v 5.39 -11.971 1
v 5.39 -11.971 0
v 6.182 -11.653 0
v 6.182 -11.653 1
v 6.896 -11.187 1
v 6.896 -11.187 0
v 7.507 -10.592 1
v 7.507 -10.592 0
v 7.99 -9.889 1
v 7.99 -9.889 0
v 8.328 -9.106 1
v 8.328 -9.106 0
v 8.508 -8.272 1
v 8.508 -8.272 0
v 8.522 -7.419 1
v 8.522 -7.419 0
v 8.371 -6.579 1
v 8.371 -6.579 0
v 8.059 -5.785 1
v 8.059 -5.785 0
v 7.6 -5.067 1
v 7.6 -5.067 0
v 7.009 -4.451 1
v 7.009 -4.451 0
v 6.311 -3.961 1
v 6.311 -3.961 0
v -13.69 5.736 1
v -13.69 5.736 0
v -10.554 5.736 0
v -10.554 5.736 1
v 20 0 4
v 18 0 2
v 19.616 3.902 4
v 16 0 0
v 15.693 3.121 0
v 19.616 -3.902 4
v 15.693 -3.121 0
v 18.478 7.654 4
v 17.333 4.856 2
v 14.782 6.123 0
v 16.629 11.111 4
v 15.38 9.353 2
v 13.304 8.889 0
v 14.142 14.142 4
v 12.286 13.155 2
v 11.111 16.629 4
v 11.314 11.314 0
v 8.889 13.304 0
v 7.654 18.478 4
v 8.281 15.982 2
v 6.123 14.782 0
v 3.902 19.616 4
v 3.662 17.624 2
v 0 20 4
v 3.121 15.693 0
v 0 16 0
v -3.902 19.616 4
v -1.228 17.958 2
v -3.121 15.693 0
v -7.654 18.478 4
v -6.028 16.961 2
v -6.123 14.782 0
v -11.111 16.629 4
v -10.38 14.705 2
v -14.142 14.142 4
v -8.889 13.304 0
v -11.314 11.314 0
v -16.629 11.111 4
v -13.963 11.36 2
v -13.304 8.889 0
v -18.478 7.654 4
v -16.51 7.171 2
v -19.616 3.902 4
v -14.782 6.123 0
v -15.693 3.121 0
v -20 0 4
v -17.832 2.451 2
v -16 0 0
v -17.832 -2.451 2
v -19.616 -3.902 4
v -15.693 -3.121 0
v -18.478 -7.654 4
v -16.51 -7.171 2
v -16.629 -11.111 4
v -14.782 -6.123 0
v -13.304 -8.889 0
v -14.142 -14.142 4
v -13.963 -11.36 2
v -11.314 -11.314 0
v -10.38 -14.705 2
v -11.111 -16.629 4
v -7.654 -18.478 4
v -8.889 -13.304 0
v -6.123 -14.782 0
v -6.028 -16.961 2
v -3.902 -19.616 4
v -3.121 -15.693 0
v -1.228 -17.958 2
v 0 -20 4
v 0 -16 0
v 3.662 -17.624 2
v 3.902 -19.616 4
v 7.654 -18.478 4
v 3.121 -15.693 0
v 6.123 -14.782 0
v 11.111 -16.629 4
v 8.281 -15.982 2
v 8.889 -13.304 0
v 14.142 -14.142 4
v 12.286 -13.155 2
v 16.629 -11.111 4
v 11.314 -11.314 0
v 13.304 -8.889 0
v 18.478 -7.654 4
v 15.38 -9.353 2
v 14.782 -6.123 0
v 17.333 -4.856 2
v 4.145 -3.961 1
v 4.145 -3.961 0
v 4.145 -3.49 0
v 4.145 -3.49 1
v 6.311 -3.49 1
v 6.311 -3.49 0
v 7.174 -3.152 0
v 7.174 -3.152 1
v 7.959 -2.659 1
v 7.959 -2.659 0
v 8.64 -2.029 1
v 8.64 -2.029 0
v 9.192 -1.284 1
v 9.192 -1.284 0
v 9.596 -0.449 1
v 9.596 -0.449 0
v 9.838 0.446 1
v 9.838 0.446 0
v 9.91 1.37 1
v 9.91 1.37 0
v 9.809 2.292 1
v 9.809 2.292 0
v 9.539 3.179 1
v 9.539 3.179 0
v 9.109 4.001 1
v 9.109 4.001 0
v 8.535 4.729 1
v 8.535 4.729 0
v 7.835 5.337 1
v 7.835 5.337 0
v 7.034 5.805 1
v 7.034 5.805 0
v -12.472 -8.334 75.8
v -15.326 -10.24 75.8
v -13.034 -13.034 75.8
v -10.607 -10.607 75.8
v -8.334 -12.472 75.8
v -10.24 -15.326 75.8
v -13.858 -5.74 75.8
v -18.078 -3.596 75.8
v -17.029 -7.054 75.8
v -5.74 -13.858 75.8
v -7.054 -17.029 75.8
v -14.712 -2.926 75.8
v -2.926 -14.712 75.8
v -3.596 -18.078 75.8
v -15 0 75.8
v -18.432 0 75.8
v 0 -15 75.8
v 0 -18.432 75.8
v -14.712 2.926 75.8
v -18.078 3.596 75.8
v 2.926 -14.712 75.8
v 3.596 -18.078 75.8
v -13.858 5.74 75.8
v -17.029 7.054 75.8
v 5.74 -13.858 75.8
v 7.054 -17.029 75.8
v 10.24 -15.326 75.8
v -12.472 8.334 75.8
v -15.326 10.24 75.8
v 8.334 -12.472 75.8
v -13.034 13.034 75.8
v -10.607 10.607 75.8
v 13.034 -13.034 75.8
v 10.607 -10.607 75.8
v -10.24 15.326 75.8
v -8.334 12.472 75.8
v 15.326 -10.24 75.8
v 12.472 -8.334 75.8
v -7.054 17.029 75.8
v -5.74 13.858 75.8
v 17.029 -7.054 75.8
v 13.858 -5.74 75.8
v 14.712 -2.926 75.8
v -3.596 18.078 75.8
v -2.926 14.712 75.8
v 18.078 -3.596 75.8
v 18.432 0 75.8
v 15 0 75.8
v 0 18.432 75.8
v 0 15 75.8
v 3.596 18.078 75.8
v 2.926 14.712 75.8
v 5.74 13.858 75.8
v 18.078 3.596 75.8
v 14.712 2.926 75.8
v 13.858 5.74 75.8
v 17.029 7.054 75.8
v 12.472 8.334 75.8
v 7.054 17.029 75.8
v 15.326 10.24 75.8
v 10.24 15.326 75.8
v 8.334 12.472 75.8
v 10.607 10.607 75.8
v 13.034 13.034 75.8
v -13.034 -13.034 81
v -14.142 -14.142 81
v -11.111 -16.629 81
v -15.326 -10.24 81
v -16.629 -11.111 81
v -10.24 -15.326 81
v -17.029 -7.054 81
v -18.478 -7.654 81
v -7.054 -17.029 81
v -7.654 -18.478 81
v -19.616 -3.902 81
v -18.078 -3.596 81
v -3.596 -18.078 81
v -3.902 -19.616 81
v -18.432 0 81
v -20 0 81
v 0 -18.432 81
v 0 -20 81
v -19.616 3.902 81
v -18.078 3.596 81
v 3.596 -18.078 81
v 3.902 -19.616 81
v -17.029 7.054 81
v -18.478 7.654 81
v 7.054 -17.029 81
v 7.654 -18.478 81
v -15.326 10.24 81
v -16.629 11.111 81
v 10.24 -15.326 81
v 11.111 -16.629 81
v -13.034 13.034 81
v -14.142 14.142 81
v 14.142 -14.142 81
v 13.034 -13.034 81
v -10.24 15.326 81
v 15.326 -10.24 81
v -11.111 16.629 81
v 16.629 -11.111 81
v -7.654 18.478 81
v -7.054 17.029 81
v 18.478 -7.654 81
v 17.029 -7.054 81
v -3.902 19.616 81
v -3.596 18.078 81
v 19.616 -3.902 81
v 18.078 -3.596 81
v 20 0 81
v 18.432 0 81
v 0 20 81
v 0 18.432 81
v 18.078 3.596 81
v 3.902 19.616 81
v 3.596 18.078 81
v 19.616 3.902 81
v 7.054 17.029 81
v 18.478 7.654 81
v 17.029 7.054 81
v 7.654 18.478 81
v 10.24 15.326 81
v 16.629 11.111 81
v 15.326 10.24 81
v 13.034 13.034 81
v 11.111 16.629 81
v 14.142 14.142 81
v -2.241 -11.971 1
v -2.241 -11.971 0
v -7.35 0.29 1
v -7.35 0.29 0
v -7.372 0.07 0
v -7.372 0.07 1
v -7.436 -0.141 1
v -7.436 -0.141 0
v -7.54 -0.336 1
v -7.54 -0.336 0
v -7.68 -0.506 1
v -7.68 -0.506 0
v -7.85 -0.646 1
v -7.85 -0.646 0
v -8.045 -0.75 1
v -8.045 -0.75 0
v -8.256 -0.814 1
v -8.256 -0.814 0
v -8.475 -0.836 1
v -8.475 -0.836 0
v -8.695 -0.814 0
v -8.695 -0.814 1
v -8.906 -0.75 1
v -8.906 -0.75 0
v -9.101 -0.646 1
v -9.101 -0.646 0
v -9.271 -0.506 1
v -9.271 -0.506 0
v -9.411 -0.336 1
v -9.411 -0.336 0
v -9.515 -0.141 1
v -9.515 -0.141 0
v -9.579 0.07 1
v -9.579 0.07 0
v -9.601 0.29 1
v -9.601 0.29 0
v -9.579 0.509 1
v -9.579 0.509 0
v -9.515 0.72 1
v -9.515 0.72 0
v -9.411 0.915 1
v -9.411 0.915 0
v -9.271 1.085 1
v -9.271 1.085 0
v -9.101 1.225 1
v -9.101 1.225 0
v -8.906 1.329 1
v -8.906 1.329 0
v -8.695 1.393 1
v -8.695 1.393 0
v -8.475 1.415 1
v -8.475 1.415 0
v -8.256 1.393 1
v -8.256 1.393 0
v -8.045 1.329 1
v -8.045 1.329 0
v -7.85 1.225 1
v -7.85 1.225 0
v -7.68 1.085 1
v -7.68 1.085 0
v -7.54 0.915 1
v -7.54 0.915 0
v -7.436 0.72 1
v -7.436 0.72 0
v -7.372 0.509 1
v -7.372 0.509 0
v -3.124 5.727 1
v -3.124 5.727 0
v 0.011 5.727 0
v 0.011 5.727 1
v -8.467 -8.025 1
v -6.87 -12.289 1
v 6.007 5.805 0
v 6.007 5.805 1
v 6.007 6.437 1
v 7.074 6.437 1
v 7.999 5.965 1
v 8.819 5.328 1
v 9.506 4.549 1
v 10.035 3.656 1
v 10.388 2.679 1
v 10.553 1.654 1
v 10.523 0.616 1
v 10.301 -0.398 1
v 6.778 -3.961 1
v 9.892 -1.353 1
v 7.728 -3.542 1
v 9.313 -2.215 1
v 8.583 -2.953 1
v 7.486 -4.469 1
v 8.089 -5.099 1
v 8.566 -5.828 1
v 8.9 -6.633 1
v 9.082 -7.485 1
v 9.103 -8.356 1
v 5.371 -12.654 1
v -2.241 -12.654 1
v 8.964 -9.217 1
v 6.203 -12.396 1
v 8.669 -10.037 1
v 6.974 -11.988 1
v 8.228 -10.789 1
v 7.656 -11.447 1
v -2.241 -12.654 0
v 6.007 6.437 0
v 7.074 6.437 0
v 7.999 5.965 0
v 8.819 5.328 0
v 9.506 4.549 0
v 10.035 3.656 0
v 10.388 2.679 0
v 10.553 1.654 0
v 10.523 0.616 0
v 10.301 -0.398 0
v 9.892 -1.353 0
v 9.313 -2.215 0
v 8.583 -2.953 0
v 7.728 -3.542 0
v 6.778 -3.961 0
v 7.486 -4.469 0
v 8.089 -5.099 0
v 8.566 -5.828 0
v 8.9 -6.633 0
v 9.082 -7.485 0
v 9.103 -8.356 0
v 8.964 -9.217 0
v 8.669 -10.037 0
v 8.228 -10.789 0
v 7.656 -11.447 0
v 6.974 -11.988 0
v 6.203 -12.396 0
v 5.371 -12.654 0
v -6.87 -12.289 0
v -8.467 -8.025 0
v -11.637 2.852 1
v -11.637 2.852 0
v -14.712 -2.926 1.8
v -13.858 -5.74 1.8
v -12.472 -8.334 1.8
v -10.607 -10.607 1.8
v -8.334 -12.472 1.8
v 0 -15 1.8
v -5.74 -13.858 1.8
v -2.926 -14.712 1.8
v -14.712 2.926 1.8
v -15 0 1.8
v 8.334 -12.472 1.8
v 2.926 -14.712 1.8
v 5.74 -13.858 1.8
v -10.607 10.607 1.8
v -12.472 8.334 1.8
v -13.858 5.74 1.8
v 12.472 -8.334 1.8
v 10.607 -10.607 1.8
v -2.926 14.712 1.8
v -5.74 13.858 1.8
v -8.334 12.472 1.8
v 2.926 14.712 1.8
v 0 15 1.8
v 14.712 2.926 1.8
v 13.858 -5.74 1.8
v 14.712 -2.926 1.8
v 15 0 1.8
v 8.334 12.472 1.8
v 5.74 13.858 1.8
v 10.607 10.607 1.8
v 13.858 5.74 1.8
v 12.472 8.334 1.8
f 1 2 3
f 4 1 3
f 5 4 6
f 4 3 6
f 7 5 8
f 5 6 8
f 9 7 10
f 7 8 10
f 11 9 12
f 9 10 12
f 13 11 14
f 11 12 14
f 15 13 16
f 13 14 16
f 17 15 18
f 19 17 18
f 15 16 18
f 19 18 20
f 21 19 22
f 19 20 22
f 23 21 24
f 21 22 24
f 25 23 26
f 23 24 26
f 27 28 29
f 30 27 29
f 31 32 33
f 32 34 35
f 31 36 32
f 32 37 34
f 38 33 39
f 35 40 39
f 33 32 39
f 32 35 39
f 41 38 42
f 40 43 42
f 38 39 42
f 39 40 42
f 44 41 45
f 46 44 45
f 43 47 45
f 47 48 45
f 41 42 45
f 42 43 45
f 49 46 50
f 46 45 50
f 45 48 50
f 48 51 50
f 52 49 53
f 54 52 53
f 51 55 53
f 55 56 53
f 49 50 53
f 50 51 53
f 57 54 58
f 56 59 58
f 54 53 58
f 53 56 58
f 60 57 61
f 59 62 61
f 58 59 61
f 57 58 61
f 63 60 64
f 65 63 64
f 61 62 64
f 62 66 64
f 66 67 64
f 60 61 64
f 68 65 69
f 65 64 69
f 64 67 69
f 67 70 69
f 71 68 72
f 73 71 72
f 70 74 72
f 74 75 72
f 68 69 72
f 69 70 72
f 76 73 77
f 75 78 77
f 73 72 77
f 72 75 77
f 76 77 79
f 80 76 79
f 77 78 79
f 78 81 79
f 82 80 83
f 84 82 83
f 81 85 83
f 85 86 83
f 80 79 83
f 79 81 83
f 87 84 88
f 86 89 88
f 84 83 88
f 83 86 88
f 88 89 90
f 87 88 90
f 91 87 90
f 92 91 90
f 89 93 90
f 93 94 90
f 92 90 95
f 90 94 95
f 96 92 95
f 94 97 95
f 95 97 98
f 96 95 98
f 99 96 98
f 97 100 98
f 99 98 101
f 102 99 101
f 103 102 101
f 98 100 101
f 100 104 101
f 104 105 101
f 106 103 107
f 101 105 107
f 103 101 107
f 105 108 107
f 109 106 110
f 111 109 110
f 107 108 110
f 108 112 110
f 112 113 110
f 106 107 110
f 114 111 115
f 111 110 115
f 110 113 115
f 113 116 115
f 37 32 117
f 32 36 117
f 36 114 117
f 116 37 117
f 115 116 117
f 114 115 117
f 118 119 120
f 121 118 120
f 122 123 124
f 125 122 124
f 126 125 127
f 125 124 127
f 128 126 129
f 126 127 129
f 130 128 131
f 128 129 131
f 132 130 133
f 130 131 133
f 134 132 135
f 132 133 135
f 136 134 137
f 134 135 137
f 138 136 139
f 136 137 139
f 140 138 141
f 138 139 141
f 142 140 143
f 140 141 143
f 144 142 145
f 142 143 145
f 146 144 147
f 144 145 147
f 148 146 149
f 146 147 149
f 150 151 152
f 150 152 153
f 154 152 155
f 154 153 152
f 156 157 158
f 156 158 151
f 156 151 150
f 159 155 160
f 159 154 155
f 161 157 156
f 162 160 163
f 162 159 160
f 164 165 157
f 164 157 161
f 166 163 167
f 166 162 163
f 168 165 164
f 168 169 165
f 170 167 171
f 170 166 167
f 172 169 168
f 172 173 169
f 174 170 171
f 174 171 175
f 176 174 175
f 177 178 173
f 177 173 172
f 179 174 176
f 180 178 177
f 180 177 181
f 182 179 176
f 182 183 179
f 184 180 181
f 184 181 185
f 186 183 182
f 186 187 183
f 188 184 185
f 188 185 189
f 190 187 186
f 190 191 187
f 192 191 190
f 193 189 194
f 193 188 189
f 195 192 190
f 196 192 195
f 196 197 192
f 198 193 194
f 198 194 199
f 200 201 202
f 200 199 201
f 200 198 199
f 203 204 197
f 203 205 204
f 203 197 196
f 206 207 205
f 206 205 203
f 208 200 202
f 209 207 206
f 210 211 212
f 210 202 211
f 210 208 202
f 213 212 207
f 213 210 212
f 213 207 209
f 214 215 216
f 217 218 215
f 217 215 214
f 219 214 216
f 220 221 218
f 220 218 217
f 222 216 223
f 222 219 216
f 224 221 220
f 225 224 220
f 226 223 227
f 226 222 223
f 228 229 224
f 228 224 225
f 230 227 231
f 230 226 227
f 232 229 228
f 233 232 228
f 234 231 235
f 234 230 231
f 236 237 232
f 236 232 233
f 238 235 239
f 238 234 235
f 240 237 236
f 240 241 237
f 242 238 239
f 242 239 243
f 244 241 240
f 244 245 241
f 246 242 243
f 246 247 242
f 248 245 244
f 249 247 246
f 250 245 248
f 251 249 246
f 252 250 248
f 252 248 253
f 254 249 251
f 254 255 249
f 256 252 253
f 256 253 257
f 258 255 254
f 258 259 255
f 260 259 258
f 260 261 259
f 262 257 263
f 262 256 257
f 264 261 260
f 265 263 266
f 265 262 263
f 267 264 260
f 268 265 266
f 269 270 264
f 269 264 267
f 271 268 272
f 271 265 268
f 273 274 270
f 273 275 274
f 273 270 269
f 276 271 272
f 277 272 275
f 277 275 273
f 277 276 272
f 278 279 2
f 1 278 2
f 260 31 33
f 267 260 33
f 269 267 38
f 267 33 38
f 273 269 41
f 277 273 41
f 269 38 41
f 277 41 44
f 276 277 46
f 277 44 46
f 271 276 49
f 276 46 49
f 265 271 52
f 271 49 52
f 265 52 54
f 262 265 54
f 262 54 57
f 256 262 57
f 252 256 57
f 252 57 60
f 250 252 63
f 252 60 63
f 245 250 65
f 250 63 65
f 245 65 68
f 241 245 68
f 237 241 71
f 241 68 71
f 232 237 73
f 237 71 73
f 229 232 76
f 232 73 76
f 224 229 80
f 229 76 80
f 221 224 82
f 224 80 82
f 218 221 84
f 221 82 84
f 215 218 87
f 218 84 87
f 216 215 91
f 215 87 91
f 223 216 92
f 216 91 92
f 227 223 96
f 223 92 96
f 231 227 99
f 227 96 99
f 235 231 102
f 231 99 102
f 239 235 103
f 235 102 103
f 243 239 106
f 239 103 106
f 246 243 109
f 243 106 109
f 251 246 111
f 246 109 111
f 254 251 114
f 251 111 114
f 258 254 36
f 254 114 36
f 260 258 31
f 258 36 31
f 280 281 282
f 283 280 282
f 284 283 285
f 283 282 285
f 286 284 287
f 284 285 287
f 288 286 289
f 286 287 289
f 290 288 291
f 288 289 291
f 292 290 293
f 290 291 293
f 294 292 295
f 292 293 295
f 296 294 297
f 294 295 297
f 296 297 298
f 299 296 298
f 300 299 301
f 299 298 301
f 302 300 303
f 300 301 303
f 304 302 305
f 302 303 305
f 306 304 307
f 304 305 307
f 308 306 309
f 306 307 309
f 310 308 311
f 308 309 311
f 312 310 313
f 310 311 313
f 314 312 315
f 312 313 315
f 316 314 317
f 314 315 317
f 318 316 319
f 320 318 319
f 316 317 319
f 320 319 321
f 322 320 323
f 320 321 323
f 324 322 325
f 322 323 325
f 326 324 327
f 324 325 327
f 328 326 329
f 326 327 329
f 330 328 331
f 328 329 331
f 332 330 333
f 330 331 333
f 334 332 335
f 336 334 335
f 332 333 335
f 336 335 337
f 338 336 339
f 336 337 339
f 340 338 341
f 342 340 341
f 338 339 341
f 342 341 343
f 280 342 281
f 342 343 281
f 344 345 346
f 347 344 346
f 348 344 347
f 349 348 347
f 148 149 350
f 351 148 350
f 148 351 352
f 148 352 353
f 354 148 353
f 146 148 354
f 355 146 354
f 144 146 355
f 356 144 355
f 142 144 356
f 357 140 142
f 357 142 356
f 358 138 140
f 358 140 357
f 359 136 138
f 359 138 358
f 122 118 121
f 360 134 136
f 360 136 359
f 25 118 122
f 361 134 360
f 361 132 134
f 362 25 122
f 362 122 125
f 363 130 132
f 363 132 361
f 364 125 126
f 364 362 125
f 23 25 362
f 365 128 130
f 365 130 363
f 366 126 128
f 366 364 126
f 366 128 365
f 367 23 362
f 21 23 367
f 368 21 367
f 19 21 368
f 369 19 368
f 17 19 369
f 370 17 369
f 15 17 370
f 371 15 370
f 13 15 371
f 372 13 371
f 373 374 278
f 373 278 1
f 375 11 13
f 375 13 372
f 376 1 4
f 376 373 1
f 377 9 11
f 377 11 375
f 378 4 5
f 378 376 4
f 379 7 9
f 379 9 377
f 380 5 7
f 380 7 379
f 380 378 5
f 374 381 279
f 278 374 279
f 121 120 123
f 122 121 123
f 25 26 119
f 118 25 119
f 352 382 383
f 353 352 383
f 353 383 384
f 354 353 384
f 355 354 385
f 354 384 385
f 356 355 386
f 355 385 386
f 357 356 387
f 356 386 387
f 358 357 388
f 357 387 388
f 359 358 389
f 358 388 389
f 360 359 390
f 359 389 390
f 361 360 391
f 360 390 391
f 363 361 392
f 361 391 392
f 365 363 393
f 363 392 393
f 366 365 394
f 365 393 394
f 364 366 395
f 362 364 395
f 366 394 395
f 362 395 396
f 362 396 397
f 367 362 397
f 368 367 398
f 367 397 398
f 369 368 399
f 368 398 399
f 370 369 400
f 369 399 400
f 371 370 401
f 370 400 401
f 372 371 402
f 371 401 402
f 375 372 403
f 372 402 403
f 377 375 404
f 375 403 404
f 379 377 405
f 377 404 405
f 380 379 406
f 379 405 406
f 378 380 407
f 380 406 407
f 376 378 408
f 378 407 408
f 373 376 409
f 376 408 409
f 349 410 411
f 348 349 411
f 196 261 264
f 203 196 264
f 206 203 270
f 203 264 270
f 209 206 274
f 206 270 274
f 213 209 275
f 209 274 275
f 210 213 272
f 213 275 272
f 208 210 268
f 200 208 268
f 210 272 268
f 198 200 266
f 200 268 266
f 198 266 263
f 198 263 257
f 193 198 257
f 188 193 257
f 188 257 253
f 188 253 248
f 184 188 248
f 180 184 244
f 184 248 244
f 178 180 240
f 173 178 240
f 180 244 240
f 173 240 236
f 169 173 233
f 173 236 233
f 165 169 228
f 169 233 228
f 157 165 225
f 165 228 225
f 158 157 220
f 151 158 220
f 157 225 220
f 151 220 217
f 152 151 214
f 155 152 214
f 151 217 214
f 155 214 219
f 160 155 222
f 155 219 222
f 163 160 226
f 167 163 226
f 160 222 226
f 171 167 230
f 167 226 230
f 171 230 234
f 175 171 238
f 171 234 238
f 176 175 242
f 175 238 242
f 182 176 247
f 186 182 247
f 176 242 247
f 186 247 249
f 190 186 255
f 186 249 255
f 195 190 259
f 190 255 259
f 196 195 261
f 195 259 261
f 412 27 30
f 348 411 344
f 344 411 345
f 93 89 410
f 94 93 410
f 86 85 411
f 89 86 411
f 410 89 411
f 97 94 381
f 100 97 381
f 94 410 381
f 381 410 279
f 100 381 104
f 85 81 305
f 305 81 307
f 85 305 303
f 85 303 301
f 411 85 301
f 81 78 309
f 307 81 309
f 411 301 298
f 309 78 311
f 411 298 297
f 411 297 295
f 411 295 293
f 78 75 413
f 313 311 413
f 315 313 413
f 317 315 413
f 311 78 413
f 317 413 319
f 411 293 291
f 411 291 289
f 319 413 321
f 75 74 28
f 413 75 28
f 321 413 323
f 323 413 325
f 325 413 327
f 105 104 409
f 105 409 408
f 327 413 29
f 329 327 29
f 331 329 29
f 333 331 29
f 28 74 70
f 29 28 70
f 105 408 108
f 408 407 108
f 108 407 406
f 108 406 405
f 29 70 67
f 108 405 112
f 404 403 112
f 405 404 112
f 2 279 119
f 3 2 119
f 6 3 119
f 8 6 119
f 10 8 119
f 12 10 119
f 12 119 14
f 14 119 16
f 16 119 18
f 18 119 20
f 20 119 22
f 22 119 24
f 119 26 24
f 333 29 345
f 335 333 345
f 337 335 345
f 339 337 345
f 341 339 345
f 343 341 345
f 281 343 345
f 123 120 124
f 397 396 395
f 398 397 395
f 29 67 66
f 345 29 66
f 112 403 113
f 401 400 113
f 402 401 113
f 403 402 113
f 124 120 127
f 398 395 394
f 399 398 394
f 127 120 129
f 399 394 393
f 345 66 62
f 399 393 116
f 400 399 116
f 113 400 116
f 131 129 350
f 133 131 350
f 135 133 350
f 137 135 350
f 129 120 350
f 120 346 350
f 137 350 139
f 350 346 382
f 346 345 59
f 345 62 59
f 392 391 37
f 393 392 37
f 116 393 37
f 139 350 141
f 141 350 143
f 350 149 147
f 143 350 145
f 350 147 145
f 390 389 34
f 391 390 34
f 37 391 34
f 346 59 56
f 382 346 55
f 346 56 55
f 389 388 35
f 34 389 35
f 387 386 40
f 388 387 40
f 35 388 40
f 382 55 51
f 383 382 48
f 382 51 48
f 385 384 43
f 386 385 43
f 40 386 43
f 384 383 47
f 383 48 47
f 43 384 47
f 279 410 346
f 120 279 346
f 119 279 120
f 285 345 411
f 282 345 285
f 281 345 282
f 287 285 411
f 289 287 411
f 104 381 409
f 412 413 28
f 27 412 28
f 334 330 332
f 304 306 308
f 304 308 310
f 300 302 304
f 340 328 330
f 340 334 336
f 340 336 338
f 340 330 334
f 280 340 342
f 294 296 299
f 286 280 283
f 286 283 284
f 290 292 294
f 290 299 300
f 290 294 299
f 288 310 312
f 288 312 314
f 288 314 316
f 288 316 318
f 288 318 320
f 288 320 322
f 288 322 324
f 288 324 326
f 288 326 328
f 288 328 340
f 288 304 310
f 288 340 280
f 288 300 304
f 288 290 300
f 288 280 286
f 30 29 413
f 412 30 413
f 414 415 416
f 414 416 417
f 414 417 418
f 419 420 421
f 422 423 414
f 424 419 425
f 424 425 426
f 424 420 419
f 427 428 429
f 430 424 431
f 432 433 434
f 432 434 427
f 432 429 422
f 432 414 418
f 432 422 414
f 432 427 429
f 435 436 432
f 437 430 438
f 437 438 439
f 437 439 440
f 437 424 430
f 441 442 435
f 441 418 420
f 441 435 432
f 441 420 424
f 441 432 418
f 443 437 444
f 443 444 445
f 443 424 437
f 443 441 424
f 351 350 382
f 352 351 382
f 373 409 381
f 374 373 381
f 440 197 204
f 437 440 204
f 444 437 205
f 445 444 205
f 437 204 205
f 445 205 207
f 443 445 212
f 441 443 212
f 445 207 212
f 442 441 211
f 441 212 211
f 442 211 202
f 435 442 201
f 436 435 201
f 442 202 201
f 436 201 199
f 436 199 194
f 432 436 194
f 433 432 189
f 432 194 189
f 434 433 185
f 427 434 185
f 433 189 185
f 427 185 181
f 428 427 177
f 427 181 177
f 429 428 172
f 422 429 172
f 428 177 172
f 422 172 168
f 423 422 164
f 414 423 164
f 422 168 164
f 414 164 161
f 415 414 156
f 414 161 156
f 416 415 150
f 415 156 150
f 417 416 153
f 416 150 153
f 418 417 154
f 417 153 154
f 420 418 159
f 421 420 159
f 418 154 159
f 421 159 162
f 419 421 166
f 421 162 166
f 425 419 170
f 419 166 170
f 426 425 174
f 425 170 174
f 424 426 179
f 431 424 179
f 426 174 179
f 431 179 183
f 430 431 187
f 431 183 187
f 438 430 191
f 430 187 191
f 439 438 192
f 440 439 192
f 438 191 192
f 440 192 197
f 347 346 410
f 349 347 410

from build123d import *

# Parameters (mm, degrees)
F0_R      = 20
F1_DEPTH  = 81
F2_R      = 18.432207
F3_DEPTH  = 5.2
F4_R      = 15
F5_DEPTH  = 74
F6_SIZE   = 4
F7_R      = 1.125396
F8_DEPTH  = 1
F10_DEPTH = 1


with BuildPart() as f1:
    # F0 (on Top) → F1 (new body)
    with BuildSketch(Plane.XY):
        Circle(F0_R)
    extrude(amount=F1_DEPTH)

    # F2 (on face) → F3 (cut)
    with BuildSketch(Plane.XY.offset(81)):
        Circle(F2_R)
    extrude(amount=-F3_DEPTH, mode=Mode.SUBTRACT)

    # F4 (on face) → F5 (cut)
    with BuildSketch(Plane.XY.offset(75.8)):
        Circle(F4_R)
    extrude(amount=-F5_DEPTH, mode=Mode.SUBTRACT)

    # F6
    f6_edges = [f1.edges().sort_by_distance(p)[0] for p in [
        (-20, 0, 0),
    ]]
    chamfer(f6_edges, length=F6_SIZE)

    # F7 (on face) → F8 (cut)
    with BuildSketch(Plane(origin=(0, 0, 0), x_dir=(1, 0, 0), z_dir=(0, 0, -1))):
        Polygon((-6.869866, 12.288648), (-8.467419, 8.024589), (-3.123957, -5.726644), (0.010684, -5.726644), align=None)
        with Locations((-8.475489, -0.289656)):
            Circle(F7_R)
        Polygon((-11.636892, -2.851509), (-13.690377, -5.736166), (-10.554273, -5.736166), align=None)
    extrude(amount=-F8_DEPTH, mode=Mode.SUBTRACT)

    # F9 (on face) → F10 (cut)
    with BuildSketch(Plane(origin=(0, 0, 0), x_dir=(1, 0, 0), z_dir=(0, 0, -1))):
        with BuildLine():
            Line((5.370924, 12.654014), (-2.24095, 12.654014))
            Line((-2.24095, 12.654014), (-2.24095, 11.971393))
            Line((-2.24095, 11.971393), (5.390103, 11.971393))
            ThreePointArc((5.390103, 11.971393), (8.507735, 8.271818), (6.310662, 3.961442))
            Line((6.310662, 3.961442), (4.144951, 3.961442))
            Line((4.144951, 3.961442), (4.144951, 3.490261))
            Line((4.144951, 3.490261), (6.310662, 3.490261))
            ThreePointArc((6.310662, 3.490261), (9.895604, -0.9064), (7.034451, -5.804997))
            Line((7.034451, -5.804997), (6.007162, -5.804997))
            Line((6.007162, -5.804997), (6.007162, -6.437175))
            Line((6.007162, -6.437175), (7.073962, -6.437175))
            ThreePointArc((7.073962, -6.437175), (10.562571, -1.134228), (6.777628, 3.961442))
            ThreePointArc((6.777628, 3.961442), (9.053097, 8.789785), (5.370924, 12.654014))
        make_face()
    extrude(amount=-F10_DEPTH, mode=Mode.SUBTRACT)


solid = f1.part
